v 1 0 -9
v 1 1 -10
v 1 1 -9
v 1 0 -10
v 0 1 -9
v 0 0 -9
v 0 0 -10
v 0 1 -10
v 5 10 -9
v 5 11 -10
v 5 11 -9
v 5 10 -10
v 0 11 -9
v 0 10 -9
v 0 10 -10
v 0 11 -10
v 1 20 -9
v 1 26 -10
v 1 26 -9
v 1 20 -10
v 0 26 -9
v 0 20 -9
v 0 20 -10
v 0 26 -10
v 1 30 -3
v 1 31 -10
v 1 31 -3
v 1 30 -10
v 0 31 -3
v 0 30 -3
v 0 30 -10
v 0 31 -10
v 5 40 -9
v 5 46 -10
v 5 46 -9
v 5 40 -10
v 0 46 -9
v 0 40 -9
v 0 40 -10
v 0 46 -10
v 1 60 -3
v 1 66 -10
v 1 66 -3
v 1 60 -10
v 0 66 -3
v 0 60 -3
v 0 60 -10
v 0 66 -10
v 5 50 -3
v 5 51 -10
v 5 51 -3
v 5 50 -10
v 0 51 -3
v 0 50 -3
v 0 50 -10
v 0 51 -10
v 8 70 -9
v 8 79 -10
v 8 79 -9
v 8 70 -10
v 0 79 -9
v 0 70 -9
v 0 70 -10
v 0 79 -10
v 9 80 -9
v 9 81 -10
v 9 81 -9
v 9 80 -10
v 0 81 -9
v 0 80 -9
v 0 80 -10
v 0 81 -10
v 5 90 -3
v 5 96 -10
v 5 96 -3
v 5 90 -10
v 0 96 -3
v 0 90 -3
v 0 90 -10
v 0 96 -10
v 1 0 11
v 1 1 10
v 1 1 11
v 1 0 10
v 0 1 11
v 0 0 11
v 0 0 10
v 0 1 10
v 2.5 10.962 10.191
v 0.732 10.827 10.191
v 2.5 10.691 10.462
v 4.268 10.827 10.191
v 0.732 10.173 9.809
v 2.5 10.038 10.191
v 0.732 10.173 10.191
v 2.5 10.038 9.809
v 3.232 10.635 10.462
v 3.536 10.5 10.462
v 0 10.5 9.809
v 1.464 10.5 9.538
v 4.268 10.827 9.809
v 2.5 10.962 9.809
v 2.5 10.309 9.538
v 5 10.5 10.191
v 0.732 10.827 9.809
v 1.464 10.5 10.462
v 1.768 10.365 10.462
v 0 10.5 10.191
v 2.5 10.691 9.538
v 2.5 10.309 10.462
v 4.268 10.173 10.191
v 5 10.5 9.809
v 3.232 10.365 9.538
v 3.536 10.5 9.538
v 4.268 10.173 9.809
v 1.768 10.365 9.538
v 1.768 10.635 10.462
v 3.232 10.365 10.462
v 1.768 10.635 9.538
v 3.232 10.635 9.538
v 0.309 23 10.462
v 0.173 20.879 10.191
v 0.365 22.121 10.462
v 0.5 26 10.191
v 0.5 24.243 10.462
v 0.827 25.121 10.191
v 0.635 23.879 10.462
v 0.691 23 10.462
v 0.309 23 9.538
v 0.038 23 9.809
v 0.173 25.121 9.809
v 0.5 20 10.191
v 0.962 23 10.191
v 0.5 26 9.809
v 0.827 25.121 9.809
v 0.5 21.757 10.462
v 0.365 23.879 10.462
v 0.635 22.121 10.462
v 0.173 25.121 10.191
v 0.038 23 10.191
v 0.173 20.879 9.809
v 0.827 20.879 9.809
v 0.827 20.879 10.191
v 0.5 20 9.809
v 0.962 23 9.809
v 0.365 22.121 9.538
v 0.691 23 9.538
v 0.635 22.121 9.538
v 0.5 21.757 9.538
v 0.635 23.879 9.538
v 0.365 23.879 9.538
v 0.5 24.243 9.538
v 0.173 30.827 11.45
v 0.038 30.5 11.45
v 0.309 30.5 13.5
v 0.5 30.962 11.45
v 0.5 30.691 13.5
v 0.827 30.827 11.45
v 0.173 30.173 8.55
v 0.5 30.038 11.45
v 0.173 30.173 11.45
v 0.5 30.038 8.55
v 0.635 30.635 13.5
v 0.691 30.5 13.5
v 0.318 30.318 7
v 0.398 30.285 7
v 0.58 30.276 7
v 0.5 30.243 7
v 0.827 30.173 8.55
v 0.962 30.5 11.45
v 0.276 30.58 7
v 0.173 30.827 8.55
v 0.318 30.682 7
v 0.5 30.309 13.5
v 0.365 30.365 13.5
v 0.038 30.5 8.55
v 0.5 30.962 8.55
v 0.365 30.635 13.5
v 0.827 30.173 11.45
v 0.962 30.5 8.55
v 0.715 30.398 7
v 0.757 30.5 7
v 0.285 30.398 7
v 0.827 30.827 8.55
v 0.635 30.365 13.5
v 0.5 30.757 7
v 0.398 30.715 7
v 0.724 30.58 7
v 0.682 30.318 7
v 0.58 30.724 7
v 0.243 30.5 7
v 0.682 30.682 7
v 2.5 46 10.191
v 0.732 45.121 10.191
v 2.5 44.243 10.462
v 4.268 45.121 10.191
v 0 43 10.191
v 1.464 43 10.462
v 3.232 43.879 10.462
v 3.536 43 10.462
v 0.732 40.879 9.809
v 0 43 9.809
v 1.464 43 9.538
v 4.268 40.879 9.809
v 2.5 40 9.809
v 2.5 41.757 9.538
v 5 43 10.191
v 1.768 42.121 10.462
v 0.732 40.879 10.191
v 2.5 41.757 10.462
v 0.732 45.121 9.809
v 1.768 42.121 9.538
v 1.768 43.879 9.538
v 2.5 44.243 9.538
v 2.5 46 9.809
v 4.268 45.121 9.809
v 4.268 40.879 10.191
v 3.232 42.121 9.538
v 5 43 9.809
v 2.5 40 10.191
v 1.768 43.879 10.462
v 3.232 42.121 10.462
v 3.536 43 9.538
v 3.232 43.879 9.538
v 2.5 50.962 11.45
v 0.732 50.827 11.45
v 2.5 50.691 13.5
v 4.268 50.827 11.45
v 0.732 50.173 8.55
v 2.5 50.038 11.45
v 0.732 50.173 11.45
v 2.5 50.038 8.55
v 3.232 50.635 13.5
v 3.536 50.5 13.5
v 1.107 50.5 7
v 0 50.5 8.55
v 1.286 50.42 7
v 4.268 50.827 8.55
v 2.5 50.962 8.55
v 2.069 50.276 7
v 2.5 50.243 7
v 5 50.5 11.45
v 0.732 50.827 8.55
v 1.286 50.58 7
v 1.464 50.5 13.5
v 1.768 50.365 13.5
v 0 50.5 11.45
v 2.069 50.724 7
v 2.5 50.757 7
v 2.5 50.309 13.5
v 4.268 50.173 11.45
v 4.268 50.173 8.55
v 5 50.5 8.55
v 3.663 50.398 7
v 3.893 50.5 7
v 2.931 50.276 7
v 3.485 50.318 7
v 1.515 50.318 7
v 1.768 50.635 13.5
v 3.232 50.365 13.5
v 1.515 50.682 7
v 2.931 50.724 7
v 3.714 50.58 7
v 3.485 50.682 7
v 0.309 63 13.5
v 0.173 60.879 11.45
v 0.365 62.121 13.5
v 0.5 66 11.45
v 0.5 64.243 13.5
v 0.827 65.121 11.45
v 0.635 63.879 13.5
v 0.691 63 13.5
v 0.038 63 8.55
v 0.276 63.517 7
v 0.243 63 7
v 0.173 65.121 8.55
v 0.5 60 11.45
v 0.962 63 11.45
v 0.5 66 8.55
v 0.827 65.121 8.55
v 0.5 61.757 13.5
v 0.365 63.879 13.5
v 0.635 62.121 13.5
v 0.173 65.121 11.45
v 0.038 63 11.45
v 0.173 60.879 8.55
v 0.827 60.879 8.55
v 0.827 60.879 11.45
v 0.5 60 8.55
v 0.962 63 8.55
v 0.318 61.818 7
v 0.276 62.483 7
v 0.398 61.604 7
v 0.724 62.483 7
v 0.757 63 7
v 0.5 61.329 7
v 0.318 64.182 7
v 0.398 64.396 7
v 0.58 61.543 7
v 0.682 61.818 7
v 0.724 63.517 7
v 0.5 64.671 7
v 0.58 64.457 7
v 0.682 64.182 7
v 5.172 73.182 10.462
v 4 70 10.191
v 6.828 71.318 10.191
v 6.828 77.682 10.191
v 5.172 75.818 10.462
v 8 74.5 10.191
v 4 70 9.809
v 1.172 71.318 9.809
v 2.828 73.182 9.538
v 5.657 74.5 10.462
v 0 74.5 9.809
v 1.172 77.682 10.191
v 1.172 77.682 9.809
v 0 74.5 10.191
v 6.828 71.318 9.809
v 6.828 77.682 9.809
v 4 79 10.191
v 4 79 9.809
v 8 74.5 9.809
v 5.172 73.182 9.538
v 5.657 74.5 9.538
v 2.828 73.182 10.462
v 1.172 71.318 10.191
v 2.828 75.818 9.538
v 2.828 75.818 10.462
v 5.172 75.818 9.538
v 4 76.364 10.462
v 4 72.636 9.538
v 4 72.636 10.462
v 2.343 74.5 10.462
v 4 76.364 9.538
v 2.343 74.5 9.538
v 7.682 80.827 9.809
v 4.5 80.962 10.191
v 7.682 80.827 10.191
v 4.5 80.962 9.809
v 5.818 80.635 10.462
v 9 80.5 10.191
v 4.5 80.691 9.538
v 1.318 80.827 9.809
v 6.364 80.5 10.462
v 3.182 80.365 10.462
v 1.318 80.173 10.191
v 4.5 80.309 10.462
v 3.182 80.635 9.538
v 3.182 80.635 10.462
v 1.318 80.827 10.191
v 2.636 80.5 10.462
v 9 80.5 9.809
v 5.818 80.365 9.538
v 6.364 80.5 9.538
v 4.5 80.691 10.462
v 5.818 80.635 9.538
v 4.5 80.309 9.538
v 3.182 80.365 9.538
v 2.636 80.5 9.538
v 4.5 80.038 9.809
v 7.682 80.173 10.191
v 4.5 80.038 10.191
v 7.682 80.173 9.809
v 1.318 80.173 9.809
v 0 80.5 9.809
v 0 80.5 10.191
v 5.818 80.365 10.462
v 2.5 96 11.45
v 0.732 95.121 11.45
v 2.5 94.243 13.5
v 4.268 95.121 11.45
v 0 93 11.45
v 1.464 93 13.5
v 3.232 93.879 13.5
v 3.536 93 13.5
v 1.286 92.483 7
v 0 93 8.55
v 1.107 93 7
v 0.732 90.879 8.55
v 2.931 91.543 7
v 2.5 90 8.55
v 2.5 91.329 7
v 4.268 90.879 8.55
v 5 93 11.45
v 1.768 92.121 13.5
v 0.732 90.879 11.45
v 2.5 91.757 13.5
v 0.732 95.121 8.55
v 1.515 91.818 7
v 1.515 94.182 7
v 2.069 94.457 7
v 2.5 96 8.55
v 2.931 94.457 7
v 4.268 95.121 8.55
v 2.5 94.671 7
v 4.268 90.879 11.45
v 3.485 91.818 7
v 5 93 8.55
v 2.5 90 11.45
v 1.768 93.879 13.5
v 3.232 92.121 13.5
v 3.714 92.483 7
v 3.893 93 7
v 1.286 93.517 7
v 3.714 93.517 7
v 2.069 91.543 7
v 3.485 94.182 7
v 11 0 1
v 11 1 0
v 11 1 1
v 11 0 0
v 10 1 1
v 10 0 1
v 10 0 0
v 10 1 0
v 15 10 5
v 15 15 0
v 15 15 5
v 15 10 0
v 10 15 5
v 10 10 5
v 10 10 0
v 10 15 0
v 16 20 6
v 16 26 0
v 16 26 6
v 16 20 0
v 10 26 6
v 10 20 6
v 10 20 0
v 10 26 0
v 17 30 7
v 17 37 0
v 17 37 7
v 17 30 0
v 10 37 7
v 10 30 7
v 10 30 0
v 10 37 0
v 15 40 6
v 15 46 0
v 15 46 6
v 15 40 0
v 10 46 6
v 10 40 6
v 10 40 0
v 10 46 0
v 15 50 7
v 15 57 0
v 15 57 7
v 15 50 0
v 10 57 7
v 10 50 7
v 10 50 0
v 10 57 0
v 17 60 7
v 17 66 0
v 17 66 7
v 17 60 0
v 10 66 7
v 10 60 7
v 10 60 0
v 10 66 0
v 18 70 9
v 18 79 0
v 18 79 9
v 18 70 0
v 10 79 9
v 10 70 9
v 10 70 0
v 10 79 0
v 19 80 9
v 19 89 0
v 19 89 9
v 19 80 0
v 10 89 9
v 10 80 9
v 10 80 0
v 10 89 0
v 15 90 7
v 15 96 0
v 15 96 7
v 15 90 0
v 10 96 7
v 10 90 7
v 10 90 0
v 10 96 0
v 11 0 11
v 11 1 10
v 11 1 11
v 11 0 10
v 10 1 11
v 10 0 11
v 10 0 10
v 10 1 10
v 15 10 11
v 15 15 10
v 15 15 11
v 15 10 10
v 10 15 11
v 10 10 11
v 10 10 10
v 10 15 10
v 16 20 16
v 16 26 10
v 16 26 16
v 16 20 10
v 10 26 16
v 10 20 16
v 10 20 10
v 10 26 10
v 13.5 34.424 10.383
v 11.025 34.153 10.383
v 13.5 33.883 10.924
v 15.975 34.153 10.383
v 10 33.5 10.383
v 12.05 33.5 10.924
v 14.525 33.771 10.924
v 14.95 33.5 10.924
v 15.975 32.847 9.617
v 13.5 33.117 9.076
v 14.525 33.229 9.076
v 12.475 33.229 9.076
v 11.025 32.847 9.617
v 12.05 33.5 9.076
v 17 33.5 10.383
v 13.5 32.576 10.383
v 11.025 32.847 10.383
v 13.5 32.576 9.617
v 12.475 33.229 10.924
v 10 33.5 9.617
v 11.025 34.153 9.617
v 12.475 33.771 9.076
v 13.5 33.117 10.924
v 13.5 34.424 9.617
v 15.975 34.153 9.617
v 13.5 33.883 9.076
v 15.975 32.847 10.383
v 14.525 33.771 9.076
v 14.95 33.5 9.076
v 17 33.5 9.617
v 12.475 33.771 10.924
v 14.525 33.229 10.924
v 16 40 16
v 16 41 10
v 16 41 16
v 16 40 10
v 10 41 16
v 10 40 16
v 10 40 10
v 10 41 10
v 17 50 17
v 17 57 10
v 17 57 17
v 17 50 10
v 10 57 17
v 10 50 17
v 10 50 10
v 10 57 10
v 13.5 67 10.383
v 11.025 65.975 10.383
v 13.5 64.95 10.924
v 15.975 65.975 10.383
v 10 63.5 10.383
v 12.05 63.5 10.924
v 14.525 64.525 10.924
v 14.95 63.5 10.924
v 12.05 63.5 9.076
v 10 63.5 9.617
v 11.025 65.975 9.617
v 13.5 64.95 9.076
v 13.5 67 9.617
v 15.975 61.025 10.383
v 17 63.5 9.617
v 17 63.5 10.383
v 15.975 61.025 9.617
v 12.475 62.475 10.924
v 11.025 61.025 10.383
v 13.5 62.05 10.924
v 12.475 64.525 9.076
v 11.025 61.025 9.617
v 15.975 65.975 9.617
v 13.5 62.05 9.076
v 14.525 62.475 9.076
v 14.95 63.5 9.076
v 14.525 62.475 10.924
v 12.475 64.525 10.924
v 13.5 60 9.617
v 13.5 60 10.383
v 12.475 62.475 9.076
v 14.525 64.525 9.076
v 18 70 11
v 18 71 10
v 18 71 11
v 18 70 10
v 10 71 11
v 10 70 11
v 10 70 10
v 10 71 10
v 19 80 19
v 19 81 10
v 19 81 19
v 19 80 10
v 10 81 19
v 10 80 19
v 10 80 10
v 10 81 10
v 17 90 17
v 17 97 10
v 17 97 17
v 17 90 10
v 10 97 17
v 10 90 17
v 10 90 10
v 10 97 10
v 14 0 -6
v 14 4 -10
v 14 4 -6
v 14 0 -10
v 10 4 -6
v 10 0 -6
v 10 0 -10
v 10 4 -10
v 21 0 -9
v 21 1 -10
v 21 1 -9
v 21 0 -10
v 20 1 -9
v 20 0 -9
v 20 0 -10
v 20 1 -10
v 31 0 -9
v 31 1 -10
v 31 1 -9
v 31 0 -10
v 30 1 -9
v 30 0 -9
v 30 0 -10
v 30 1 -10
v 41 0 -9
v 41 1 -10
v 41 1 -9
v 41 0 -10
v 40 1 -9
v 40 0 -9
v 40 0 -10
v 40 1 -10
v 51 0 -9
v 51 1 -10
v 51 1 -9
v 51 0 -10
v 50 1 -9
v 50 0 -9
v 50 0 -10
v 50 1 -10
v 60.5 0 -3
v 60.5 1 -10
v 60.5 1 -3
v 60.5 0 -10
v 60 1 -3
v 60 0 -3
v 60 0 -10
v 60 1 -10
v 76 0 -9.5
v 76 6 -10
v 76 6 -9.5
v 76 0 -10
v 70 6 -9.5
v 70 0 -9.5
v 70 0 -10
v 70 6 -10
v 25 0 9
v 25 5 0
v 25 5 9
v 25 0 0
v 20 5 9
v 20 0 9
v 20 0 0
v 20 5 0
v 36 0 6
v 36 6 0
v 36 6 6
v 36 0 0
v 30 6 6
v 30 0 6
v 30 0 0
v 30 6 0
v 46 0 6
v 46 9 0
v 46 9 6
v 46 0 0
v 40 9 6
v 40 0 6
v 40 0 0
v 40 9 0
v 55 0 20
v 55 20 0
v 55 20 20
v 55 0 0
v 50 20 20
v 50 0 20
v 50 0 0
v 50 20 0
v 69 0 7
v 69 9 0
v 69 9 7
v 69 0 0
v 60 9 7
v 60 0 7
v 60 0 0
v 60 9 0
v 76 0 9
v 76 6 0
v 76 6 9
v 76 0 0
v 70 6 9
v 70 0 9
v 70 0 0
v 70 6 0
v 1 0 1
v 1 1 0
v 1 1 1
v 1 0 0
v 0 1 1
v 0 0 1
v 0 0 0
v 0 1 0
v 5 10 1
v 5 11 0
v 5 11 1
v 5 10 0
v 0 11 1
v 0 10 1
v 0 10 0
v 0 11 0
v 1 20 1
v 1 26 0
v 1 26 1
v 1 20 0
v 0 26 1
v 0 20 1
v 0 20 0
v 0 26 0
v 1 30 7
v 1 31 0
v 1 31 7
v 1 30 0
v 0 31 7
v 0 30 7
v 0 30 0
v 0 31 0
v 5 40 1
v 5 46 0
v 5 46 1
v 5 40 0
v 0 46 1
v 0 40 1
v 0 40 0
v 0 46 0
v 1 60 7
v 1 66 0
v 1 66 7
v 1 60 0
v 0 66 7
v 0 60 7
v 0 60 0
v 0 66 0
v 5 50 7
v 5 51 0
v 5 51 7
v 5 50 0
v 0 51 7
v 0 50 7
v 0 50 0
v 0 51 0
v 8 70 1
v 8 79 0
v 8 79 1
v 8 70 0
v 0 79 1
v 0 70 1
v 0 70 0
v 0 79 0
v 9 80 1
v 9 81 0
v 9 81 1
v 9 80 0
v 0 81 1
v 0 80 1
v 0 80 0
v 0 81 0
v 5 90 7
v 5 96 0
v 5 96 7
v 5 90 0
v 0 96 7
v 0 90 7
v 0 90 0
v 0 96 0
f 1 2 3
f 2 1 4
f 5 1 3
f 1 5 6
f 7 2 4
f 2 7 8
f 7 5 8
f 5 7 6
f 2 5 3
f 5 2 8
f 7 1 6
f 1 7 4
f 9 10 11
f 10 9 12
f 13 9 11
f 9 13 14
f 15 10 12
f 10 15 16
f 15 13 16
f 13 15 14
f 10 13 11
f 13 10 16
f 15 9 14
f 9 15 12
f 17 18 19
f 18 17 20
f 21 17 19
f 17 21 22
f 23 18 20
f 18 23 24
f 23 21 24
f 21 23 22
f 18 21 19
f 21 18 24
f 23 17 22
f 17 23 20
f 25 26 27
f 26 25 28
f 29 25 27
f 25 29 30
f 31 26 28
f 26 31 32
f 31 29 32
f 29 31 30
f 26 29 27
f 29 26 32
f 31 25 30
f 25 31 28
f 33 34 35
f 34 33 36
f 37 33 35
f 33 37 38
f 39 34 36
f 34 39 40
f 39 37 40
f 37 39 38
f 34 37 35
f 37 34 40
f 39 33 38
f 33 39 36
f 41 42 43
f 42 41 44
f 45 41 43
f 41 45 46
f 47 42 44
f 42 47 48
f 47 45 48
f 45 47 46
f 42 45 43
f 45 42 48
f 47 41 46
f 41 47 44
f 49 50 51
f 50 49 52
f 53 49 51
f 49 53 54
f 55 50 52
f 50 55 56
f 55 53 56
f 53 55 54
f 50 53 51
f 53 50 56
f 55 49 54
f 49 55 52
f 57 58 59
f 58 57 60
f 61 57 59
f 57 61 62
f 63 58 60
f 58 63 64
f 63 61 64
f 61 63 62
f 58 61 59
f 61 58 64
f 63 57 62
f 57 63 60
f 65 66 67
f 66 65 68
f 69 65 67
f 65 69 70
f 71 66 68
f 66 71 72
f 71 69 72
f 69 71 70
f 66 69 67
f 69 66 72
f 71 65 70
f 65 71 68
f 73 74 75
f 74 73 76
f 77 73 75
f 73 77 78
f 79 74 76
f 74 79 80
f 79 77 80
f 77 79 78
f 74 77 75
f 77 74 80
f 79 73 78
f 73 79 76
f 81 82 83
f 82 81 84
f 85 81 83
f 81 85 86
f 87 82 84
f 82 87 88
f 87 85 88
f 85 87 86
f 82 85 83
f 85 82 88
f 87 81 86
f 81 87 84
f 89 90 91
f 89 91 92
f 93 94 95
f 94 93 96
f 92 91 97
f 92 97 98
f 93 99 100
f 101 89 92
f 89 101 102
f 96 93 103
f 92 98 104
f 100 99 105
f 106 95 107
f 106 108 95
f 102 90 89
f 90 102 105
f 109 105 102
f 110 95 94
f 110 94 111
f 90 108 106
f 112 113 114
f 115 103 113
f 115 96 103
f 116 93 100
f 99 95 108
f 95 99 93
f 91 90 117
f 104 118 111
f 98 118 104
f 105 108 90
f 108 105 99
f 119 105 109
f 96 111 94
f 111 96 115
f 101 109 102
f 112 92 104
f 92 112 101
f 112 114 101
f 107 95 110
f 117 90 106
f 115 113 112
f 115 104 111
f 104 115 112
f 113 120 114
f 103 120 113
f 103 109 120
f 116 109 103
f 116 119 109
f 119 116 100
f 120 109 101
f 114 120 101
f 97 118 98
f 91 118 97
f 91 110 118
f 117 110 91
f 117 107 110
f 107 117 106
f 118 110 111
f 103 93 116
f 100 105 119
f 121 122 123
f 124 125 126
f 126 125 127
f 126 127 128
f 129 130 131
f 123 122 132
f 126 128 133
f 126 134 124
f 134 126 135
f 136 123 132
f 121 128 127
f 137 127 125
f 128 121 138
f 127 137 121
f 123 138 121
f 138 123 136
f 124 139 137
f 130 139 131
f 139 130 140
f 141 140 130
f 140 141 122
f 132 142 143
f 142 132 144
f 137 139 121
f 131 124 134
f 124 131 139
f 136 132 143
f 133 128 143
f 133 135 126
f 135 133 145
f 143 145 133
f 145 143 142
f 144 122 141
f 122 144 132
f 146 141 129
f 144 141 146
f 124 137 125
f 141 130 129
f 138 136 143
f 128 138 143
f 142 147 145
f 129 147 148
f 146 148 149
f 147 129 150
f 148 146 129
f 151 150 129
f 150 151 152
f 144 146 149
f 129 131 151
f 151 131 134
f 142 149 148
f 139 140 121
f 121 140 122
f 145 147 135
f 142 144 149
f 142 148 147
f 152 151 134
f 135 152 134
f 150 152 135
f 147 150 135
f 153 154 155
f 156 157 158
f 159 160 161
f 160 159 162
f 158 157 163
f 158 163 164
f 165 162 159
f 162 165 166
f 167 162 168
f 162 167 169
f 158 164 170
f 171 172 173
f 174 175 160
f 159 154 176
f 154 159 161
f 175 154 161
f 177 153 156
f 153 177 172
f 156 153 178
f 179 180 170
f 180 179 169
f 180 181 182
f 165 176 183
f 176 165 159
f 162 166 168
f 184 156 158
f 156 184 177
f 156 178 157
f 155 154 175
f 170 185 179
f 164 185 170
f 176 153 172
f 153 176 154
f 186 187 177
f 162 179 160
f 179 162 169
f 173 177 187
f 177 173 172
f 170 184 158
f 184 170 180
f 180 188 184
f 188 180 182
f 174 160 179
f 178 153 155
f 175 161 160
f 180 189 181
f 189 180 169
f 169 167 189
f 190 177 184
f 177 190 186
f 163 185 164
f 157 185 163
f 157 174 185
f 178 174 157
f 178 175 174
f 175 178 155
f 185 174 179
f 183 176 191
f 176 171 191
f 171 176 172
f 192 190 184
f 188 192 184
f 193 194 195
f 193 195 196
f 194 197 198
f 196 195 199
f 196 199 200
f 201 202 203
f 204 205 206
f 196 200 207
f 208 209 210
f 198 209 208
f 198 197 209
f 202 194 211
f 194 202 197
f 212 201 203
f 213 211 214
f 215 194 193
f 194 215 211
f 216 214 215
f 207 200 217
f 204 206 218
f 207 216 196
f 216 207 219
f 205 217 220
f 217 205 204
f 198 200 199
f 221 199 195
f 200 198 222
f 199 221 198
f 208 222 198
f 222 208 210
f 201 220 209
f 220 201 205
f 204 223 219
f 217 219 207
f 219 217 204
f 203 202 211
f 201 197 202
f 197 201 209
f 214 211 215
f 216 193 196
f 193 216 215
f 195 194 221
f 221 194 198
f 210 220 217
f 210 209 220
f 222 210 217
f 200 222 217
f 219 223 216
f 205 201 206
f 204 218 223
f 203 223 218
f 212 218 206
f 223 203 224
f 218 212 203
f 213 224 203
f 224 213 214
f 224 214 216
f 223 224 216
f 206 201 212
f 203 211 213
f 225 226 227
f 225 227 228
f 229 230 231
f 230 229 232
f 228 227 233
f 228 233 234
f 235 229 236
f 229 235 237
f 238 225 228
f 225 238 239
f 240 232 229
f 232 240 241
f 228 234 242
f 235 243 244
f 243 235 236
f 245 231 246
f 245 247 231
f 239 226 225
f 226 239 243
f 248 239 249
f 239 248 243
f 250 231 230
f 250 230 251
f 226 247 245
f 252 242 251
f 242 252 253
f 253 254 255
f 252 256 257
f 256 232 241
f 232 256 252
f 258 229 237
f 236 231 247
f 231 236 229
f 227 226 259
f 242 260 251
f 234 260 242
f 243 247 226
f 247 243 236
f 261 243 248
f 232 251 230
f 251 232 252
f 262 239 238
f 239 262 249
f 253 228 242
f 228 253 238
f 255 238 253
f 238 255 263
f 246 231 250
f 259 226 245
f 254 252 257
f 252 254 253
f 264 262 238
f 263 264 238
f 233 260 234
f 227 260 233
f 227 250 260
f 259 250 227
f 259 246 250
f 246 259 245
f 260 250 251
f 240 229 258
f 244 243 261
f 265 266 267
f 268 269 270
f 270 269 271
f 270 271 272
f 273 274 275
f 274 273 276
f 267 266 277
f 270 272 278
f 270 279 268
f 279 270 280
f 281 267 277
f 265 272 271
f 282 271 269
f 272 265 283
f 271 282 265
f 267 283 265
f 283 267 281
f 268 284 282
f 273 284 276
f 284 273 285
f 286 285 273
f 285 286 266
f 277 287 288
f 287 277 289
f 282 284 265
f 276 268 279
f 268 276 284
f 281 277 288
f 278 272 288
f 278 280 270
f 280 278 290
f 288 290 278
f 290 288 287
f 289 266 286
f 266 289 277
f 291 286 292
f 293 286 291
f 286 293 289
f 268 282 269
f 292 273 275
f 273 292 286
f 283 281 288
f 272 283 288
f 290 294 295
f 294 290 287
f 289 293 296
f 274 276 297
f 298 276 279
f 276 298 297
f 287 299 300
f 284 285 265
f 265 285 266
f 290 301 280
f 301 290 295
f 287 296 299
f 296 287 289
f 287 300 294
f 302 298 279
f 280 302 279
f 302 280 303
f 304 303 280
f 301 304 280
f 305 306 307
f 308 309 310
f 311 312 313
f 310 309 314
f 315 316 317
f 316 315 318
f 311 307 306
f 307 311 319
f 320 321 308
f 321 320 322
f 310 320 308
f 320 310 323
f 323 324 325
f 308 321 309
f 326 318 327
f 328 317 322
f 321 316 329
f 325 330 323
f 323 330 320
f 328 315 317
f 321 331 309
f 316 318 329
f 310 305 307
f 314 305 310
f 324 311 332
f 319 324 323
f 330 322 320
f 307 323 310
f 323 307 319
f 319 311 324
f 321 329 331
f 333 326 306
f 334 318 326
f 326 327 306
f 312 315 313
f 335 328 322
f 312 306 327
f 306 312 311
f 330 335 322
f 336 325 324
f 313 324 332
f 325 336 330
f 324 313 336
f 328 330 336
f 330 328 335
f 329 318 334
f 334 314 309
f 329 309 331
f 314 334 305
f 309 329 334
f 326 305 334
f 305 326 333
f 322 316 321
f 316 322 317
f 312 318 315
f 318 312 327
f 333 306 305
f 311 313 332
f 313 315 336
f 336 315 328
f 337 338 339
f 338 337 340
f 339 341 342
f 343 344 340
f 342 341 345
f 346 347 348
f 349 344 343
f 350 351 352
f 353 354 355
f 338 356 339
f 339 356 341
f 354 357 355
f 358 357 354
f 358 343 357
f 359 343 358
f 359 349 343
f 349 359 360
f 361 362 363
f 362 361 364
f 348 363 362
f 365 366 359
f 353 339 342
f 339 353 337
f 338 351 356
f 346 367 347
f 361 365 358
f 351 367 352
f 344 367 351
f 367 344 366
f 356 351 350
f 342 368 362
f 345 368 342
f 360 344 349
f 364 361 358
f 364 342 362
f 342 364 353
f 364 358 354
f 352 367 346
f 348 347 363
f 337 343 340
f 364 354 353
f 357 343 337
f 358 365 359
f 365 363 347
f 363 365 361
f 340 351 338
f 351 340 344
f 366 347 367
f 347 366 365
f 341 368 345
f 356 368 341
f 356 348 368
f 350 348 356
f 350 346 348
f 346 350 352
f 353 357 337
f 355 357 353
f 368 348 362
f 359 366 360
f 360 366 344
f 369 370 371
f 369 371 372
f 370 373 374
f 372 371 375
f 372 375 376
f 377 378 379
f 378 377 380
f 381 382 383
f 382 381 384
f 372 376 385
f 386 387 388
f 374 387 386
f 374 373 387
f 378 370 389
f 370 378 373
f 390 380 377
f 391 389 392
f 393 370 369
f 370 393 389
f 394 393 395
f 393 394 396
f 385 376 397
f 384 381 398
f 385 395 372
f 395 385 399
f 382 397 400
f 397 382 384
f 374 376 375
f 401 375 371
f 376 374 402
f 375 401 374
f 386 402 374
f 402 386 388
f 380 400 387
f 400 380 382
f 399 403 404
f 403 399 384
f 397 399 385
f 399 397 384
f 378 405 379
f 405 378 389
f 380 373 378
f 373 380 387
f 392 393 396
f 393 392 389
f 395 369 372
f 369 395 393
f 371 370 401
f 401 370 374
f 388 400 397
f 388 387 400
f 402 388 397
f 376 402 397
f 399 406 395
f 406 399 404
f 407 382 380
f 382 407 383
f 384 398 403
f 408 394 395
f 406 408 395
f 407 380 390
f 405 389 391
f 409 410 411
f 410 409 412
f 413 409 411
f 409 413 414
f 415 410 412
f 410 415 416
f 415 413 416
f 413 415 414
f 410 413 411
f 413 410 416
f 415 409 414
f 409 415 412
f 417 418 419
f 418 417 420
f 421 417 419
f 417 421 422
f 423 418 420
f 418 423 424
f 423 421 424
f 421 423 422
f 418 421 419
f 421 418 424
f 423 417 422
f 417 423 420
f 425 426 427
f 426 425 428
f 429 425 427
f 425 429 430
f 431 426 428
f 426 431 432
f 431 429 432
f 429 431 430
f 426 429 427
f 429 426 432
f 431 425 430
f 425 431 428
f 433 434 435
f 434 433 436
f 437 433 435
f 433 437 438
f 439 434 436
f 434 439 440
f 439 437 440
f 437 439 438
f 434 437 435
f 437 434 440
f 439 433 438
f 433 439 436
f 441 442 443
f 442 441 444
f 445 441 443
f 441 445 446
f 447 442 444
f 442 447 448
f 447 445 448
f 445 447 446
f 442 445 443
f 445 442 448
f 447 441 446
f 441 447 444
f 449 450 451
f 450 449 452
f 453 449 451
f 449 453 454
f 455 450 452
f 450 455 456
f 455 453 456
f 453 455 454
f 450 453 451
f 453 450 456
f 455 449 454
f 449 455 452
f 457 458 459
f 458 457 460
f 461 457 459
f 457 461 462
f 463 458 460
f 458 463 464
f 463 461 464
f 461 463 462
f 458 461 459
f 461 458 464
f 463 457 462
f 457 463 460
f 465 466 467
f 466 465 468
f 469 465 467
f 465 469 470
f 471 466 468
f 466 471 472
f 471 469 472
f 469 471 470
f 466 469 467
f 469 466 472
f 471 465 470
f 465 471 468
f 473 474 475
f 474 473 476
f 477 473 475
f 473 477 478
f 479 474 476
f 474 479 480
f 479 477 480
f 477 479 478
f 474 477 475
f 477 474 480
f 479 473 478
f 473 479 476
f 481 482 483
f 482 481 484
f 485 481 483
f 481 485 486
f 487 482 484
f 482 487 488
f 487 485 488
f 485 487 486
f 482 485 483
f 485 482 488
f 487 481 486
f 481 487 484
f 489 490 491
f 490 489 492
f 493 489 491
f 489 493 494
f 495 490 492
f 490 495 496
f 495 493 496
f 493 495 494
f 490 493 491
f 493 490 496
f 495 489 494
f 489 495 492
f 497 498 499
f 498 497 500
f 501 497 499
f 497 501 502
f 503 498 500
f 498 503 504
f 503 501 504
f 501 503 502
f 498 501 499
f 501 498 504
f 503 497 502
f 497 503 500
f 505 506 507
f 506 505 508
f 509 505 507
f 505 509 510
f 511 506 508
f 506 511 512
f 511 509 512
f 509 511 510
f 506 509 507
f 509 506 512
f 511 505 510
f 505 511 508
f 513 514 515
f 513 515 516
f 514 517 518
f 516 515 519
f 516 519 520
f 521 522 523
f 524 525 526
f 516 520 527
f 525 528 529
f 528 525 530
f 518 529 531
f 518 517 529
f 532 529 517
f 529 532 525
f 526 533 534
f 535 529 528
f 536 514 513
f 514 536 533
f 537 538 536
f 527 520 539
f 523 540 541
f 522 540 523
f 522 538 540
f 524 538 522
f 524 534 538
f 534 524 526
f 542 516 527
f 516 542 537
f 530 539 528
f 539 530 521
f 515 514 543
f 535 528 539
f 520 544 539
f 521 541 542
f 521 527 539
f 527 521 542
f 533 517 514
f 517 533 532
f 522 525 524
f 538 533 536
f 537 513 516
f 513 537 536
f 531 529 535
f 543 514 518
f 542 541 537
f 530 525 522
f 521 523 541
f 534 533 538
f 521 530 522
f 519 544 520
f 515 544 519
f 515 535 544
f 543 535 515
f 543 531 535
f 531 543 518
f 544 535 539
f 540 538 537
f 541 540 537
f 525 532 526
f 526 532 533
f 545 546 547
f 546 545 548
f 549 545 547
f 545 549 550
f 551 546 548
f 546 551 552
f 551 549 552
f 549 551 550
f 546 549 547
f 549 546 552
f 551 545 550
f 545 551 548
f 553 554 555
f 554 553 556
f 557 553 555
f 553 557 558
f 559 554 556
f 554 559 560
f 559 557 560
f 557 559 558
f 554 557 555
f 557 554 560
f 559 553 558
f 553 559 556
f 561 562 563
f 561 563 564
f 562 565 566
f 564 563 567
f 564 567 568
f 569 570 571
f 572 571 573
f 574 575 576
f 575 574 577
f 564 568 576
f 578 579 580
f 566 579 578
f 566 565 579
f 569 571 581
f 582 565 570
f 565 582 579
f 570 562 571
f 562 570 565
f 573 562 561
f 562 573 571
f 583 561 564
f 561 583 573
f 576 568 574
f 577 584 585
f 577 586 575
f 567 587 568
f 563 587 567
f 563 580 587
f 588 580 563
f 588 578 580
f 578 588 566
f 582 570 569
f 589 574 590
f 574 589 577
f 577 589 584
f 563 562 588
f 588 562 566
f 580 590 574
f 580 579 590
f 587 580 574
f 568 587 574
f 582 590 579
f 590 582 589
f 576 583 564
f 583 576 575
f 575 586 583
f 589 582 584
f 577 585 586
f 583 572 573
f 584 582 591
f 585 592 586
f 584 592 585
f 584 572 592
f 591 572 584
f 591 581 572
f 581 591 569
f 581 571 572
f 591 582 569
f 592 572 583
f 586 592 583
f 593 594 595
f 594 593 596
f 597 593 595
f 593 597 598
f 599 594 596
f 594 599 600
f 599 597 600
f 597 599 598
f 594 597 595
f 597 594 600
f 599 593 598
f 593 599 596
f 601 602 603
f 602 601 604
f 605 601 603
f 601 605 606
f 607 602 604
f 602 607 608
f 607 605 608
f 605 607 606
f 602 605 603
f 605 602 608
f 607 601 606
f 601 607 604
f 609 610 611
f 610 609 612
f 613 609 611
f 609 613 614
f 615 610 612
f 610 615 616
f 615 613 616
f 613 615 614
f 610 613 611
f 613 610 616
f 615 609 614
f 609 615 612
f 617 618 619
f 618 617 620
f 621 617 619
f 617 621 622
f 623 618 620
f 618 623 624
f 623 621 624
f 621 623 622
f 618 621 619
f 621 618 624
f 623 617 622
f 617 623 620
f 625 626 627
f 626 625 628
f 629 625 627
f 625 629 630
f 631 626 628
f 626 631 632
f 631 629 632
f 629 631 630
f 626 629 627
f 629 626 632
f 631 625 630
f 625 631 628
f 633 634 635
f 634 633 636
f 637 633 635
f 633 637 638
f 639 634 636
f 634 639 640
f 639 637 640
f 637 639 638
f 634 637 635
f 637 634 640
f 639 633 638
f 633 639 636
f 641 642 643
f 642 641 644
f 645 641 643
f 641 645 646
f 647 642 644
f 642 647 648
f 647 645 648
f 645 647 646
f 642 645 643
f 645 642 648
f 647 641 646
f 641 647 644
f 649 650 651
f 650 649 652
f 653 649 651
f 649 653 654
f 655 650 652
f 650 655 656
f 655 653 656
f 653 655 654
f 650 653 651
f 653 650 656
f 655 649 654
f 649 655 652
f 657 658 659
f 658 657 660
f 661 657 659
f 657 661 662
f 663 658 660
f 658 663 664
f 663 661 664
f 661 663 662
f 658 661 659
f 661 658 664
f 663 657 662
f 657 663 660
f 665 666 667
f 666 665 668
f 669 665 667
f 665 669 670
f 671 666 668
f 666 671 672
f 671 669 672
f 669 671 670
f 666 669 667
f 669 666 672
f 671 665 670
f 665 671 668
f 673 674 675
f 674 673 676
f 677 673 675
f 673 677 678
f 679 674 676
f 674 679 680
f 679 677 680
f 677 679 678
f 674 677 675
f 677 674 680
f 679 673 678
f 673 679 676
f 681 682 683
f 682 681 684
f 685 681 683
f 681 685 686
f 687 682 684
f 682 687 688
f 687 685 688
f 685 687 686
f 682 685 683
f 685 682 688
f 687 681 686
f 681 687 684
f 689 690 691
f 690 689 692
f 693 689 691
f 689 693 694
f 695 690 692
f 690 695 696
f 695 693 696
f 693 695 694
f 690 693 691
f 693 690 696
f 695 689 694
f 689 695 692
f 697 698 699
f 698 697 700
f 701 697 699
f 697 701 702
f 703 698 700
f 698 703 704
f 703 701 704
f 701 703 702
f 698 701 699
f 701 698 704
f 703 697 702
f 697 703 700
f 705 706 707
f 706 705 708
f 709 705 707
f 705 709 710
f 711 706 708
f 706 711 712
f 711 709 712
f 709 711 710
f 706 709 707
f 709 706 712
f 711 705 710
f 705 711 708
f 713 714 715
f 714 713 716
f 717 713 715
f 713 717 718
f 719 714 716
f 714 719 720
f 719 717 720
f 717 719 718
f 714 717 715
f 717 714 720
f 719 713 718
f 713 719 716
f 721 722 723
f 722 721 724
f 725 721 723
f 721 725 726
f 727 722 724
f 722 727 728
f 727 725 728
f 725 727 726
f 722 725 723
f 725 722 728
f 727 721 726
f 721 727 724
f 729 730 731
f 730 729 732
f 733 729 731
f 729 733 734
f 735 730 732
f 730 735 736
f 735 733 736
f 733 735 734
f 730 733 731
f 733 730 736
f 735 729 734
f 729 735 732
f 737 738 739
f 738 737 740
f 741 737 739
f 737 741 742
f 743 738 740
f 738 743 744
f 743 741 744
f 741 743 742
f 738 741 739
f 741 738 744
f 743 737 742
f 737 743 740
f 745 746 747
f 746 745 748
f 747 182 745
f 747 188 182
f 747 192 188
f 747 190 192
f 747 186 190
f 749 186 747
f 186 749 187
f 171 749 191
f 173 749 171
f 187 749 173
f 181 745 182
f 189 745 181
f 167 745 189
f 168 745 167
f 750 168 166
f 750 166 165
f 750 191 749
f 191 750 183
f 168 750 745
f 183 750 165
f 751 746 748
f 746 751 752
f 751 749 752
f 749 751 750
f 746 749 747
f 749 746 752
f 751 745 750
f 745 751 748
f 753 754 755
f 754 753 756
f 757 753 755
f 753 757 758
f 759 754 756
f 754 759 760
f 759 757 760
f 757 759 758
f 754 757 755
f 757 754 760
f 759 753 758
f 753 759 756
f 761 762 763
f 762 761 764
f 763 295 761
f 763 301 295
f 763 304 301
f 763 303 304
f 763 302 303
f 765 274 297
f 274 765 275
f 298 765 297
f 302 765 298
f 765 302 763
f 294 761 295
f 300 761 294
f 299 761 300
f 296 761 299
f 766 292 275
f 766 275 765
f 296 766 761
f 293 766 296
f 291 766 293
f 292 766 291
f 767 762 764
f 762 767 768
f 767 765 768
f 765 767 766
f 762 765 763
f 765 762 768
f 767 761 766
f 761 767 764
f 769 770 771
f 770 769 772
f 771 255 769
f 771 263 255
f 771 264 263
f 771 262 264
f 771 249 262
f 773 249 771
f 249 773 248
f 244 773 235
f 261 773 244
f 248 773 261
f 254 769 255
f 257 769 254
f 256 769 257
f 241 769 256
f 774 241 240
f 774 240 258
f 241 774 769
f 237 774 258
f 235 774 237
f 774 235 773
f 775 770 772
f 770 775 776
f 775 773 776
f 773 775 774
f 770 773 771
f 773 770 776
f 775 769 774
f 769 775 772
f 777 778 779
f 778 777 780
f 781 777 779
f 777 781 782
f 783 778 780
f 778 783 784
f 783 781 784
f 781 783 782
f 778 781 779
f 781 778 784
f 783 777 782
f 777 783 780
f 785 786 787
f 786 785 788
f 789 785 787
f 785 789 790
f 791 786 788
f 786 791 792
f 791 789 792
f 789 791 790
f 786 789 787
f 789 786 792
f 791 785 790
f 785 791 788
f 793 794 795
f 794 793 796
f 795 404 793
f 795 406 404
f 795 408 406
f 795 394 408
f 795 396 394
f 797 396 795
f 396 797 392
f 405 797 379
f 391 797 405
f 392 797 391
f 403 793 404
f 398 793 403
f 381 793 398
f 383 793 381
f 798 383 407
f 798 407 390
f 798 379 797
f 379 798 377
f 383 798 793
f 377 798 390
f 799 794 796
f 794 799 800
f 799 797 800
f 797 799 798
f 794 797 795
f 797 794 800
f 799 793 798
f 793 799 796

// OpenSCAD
// Volume: 8883.559886945104, SurfaceArea: 8761.056318695557
// bottom row (red) = reference
// middle row (gold) = should match reference
// top row (blue) = should be 'spherical' versions of gold row,
//     and should be inscribed in gold row in 'top' view
// back row (green) = should be all cubes auto-scaled up
// back top (purple) = uses 'auto' feature
// lime green = 'auto' feature where we 'shrink'
// pink = recursive resize, negative, <1, wrong syntax, etc

$fn=8;

color("red") {
translate([0, 0,-10]) cube(); 
translate([0,10,-10]) cube([5,1,1]);
translate([0,20,-10]) cube([1,6,1]);
translate([0,30,-10]) cube([1,1,7]);
translate([0,40,-10]) cube([5,6,1]); 
translate([0,60,-10]) cube([1,6,7]);
translate([0,50,-10]) cube([5,1,7]);
translate([0,70,-10]) cube([8,9,1]);
translate([0,80,-10]) cube([9,1,1]);
translate([0,90,-10]) cube([5,6,7]);
}

translate([0, 0,0]) cube(); 
translate([0,10,0]) resize([5,0,0]) cube(); 
translate([0,20,0]) resize([0,6,0]) cube(); 
translate([0,30,0]) resize([0,0,7]) cube(); 
translate([0,40,0]) resize([5,6,0]) cube(); 
translate([0,60,0]) resize([0,6,7]) cube(); 
translate([0,50,0]) resize([5,0,7]) cube(); 
translate([0,70,0]) resize([8,9]) cube(); 
translate([0,80,0]) resize([9]) cube(); 
translate([0,90,0]) resize([5,6,7]) cube(); 

color("blue"){
translate([0, 0,10]) cube(); 
translate([2.5,10.5,10]) resize([5,0,0]) sphere(0.5); 
translate([0.5,23,10]) resize([0,6,0]) sphere(0.5); 
translate([0.5,30.5,10]) resize([0,0,7]) sphere(0.5); 
translate([2.5,43,10]) resize([5,6,0]) sphere(0.5); 
translate([2.5,50.5,10]) resize([5,0,7]) sphere(0.5); 
translate([0.5,63,10]) resize([0,6,7]) sphere(0.5); 
translate([4,74.5,10]) resize([8,9]) sphere(0.5); 
translate([4.5,80.5,10]) resize([9]) sphere(0.5); 
translate([2.5,93,10]) resize([5,6,7]) sphere(0.5); 
}

color("green"){
translate([10, 0, 0]) cube(); 
translate([10,10,0]) resize([5,0,0],auto=true) cube(); 
translate([10,20,0]) resize([0,6,0],auto=true) cube(); 
translate([10,30,0]) resize([0,0,7],auto=true) cube(); 
translate([10,40,0]) resize([5,6,0],true) cube(); 
translate([10,50,0]) resize([5,0,7],true) cube(); 
translate([10,60,0]) resize([0,6,7],auto=true) cube(); 
translate([10,70,0]) resize([8,9],auto=true) cube(); 
translate([10,80,0]) resize([9],true) cube(); 
translate([10,90,0]) resize([5,6,7],auto=true) cube(); 
}

color("purple"){
translate([10, 0, 10]) cube(); 
translate([10,10,10]) resize([5,0,0],auto=[true,true,false]) cube();
translate([10,20,10]) resize([6,0,0],auto=[true,true,true]) cube(); 
translate([13.5,33.5,10]) resize([7,0,0],auto=[true,false,false]) sphere(); 
translate([10,40,10]) resize([6,0,0],auto=[true,false,true]) cube(); 
translate([10,50,10]) resize([7,0,7],auto=[false,true,true]) cube(); 
translate([13.5,63.5,10]) resize([7,0,0],auto=[false,true,false]) sphere(); 
translate([10,70,10]) resize([8,0,0],auto=[false,false,false]) cube(); 
translate([10,80,10]) resize([9,0,0],auto=[false,false,true]) cube(); 
translate([10,90,10]) resize([0,0,7],auto=[true,true,false]) cube();
}

color("pink"){
translate([10 , 0,-10]) resize([4,4,4]) resize([5000,100,1000]) cube();
translate([20,0,-10]) resize([-5,0,0]) cube(); 
translate([30,0,-10]) resize([-5,0,0],auto=3) cube(); 
translate([40,0,-10]) resize(-5,0,0,auto=3) cube(); 
translate([50,0,-10]) resize(5,0,0) cube(); 
translate([60,0,-10]) resize([0.5,0,7]) cube([0.5,1,1000]);
translate([70,0,-10]) resize([0,0,0.5]) cube([6,6,10000000000]);
}

color("lime"){ 
translate([20,0,0]) resize([5,0,0],auto=[true,true,false]) cube(9); 
translate([30,0,0]) resize([6,0,0],auto=[true,true,true]) cube(9); 
translate([40,0,0]) resize([6,0,0],auto=[true,false,true]) cube(9); 
translate([50,0,0]) resize([5,0,20],auto=[false,true,true]) cube(9); 
translate([60,0,0]) resize([0,0,7],auto=[false,false,true]) cube(9); 
translate([70,0,0]) resize([6,0,0],auto=[true,true,false]) cube(9);
}
